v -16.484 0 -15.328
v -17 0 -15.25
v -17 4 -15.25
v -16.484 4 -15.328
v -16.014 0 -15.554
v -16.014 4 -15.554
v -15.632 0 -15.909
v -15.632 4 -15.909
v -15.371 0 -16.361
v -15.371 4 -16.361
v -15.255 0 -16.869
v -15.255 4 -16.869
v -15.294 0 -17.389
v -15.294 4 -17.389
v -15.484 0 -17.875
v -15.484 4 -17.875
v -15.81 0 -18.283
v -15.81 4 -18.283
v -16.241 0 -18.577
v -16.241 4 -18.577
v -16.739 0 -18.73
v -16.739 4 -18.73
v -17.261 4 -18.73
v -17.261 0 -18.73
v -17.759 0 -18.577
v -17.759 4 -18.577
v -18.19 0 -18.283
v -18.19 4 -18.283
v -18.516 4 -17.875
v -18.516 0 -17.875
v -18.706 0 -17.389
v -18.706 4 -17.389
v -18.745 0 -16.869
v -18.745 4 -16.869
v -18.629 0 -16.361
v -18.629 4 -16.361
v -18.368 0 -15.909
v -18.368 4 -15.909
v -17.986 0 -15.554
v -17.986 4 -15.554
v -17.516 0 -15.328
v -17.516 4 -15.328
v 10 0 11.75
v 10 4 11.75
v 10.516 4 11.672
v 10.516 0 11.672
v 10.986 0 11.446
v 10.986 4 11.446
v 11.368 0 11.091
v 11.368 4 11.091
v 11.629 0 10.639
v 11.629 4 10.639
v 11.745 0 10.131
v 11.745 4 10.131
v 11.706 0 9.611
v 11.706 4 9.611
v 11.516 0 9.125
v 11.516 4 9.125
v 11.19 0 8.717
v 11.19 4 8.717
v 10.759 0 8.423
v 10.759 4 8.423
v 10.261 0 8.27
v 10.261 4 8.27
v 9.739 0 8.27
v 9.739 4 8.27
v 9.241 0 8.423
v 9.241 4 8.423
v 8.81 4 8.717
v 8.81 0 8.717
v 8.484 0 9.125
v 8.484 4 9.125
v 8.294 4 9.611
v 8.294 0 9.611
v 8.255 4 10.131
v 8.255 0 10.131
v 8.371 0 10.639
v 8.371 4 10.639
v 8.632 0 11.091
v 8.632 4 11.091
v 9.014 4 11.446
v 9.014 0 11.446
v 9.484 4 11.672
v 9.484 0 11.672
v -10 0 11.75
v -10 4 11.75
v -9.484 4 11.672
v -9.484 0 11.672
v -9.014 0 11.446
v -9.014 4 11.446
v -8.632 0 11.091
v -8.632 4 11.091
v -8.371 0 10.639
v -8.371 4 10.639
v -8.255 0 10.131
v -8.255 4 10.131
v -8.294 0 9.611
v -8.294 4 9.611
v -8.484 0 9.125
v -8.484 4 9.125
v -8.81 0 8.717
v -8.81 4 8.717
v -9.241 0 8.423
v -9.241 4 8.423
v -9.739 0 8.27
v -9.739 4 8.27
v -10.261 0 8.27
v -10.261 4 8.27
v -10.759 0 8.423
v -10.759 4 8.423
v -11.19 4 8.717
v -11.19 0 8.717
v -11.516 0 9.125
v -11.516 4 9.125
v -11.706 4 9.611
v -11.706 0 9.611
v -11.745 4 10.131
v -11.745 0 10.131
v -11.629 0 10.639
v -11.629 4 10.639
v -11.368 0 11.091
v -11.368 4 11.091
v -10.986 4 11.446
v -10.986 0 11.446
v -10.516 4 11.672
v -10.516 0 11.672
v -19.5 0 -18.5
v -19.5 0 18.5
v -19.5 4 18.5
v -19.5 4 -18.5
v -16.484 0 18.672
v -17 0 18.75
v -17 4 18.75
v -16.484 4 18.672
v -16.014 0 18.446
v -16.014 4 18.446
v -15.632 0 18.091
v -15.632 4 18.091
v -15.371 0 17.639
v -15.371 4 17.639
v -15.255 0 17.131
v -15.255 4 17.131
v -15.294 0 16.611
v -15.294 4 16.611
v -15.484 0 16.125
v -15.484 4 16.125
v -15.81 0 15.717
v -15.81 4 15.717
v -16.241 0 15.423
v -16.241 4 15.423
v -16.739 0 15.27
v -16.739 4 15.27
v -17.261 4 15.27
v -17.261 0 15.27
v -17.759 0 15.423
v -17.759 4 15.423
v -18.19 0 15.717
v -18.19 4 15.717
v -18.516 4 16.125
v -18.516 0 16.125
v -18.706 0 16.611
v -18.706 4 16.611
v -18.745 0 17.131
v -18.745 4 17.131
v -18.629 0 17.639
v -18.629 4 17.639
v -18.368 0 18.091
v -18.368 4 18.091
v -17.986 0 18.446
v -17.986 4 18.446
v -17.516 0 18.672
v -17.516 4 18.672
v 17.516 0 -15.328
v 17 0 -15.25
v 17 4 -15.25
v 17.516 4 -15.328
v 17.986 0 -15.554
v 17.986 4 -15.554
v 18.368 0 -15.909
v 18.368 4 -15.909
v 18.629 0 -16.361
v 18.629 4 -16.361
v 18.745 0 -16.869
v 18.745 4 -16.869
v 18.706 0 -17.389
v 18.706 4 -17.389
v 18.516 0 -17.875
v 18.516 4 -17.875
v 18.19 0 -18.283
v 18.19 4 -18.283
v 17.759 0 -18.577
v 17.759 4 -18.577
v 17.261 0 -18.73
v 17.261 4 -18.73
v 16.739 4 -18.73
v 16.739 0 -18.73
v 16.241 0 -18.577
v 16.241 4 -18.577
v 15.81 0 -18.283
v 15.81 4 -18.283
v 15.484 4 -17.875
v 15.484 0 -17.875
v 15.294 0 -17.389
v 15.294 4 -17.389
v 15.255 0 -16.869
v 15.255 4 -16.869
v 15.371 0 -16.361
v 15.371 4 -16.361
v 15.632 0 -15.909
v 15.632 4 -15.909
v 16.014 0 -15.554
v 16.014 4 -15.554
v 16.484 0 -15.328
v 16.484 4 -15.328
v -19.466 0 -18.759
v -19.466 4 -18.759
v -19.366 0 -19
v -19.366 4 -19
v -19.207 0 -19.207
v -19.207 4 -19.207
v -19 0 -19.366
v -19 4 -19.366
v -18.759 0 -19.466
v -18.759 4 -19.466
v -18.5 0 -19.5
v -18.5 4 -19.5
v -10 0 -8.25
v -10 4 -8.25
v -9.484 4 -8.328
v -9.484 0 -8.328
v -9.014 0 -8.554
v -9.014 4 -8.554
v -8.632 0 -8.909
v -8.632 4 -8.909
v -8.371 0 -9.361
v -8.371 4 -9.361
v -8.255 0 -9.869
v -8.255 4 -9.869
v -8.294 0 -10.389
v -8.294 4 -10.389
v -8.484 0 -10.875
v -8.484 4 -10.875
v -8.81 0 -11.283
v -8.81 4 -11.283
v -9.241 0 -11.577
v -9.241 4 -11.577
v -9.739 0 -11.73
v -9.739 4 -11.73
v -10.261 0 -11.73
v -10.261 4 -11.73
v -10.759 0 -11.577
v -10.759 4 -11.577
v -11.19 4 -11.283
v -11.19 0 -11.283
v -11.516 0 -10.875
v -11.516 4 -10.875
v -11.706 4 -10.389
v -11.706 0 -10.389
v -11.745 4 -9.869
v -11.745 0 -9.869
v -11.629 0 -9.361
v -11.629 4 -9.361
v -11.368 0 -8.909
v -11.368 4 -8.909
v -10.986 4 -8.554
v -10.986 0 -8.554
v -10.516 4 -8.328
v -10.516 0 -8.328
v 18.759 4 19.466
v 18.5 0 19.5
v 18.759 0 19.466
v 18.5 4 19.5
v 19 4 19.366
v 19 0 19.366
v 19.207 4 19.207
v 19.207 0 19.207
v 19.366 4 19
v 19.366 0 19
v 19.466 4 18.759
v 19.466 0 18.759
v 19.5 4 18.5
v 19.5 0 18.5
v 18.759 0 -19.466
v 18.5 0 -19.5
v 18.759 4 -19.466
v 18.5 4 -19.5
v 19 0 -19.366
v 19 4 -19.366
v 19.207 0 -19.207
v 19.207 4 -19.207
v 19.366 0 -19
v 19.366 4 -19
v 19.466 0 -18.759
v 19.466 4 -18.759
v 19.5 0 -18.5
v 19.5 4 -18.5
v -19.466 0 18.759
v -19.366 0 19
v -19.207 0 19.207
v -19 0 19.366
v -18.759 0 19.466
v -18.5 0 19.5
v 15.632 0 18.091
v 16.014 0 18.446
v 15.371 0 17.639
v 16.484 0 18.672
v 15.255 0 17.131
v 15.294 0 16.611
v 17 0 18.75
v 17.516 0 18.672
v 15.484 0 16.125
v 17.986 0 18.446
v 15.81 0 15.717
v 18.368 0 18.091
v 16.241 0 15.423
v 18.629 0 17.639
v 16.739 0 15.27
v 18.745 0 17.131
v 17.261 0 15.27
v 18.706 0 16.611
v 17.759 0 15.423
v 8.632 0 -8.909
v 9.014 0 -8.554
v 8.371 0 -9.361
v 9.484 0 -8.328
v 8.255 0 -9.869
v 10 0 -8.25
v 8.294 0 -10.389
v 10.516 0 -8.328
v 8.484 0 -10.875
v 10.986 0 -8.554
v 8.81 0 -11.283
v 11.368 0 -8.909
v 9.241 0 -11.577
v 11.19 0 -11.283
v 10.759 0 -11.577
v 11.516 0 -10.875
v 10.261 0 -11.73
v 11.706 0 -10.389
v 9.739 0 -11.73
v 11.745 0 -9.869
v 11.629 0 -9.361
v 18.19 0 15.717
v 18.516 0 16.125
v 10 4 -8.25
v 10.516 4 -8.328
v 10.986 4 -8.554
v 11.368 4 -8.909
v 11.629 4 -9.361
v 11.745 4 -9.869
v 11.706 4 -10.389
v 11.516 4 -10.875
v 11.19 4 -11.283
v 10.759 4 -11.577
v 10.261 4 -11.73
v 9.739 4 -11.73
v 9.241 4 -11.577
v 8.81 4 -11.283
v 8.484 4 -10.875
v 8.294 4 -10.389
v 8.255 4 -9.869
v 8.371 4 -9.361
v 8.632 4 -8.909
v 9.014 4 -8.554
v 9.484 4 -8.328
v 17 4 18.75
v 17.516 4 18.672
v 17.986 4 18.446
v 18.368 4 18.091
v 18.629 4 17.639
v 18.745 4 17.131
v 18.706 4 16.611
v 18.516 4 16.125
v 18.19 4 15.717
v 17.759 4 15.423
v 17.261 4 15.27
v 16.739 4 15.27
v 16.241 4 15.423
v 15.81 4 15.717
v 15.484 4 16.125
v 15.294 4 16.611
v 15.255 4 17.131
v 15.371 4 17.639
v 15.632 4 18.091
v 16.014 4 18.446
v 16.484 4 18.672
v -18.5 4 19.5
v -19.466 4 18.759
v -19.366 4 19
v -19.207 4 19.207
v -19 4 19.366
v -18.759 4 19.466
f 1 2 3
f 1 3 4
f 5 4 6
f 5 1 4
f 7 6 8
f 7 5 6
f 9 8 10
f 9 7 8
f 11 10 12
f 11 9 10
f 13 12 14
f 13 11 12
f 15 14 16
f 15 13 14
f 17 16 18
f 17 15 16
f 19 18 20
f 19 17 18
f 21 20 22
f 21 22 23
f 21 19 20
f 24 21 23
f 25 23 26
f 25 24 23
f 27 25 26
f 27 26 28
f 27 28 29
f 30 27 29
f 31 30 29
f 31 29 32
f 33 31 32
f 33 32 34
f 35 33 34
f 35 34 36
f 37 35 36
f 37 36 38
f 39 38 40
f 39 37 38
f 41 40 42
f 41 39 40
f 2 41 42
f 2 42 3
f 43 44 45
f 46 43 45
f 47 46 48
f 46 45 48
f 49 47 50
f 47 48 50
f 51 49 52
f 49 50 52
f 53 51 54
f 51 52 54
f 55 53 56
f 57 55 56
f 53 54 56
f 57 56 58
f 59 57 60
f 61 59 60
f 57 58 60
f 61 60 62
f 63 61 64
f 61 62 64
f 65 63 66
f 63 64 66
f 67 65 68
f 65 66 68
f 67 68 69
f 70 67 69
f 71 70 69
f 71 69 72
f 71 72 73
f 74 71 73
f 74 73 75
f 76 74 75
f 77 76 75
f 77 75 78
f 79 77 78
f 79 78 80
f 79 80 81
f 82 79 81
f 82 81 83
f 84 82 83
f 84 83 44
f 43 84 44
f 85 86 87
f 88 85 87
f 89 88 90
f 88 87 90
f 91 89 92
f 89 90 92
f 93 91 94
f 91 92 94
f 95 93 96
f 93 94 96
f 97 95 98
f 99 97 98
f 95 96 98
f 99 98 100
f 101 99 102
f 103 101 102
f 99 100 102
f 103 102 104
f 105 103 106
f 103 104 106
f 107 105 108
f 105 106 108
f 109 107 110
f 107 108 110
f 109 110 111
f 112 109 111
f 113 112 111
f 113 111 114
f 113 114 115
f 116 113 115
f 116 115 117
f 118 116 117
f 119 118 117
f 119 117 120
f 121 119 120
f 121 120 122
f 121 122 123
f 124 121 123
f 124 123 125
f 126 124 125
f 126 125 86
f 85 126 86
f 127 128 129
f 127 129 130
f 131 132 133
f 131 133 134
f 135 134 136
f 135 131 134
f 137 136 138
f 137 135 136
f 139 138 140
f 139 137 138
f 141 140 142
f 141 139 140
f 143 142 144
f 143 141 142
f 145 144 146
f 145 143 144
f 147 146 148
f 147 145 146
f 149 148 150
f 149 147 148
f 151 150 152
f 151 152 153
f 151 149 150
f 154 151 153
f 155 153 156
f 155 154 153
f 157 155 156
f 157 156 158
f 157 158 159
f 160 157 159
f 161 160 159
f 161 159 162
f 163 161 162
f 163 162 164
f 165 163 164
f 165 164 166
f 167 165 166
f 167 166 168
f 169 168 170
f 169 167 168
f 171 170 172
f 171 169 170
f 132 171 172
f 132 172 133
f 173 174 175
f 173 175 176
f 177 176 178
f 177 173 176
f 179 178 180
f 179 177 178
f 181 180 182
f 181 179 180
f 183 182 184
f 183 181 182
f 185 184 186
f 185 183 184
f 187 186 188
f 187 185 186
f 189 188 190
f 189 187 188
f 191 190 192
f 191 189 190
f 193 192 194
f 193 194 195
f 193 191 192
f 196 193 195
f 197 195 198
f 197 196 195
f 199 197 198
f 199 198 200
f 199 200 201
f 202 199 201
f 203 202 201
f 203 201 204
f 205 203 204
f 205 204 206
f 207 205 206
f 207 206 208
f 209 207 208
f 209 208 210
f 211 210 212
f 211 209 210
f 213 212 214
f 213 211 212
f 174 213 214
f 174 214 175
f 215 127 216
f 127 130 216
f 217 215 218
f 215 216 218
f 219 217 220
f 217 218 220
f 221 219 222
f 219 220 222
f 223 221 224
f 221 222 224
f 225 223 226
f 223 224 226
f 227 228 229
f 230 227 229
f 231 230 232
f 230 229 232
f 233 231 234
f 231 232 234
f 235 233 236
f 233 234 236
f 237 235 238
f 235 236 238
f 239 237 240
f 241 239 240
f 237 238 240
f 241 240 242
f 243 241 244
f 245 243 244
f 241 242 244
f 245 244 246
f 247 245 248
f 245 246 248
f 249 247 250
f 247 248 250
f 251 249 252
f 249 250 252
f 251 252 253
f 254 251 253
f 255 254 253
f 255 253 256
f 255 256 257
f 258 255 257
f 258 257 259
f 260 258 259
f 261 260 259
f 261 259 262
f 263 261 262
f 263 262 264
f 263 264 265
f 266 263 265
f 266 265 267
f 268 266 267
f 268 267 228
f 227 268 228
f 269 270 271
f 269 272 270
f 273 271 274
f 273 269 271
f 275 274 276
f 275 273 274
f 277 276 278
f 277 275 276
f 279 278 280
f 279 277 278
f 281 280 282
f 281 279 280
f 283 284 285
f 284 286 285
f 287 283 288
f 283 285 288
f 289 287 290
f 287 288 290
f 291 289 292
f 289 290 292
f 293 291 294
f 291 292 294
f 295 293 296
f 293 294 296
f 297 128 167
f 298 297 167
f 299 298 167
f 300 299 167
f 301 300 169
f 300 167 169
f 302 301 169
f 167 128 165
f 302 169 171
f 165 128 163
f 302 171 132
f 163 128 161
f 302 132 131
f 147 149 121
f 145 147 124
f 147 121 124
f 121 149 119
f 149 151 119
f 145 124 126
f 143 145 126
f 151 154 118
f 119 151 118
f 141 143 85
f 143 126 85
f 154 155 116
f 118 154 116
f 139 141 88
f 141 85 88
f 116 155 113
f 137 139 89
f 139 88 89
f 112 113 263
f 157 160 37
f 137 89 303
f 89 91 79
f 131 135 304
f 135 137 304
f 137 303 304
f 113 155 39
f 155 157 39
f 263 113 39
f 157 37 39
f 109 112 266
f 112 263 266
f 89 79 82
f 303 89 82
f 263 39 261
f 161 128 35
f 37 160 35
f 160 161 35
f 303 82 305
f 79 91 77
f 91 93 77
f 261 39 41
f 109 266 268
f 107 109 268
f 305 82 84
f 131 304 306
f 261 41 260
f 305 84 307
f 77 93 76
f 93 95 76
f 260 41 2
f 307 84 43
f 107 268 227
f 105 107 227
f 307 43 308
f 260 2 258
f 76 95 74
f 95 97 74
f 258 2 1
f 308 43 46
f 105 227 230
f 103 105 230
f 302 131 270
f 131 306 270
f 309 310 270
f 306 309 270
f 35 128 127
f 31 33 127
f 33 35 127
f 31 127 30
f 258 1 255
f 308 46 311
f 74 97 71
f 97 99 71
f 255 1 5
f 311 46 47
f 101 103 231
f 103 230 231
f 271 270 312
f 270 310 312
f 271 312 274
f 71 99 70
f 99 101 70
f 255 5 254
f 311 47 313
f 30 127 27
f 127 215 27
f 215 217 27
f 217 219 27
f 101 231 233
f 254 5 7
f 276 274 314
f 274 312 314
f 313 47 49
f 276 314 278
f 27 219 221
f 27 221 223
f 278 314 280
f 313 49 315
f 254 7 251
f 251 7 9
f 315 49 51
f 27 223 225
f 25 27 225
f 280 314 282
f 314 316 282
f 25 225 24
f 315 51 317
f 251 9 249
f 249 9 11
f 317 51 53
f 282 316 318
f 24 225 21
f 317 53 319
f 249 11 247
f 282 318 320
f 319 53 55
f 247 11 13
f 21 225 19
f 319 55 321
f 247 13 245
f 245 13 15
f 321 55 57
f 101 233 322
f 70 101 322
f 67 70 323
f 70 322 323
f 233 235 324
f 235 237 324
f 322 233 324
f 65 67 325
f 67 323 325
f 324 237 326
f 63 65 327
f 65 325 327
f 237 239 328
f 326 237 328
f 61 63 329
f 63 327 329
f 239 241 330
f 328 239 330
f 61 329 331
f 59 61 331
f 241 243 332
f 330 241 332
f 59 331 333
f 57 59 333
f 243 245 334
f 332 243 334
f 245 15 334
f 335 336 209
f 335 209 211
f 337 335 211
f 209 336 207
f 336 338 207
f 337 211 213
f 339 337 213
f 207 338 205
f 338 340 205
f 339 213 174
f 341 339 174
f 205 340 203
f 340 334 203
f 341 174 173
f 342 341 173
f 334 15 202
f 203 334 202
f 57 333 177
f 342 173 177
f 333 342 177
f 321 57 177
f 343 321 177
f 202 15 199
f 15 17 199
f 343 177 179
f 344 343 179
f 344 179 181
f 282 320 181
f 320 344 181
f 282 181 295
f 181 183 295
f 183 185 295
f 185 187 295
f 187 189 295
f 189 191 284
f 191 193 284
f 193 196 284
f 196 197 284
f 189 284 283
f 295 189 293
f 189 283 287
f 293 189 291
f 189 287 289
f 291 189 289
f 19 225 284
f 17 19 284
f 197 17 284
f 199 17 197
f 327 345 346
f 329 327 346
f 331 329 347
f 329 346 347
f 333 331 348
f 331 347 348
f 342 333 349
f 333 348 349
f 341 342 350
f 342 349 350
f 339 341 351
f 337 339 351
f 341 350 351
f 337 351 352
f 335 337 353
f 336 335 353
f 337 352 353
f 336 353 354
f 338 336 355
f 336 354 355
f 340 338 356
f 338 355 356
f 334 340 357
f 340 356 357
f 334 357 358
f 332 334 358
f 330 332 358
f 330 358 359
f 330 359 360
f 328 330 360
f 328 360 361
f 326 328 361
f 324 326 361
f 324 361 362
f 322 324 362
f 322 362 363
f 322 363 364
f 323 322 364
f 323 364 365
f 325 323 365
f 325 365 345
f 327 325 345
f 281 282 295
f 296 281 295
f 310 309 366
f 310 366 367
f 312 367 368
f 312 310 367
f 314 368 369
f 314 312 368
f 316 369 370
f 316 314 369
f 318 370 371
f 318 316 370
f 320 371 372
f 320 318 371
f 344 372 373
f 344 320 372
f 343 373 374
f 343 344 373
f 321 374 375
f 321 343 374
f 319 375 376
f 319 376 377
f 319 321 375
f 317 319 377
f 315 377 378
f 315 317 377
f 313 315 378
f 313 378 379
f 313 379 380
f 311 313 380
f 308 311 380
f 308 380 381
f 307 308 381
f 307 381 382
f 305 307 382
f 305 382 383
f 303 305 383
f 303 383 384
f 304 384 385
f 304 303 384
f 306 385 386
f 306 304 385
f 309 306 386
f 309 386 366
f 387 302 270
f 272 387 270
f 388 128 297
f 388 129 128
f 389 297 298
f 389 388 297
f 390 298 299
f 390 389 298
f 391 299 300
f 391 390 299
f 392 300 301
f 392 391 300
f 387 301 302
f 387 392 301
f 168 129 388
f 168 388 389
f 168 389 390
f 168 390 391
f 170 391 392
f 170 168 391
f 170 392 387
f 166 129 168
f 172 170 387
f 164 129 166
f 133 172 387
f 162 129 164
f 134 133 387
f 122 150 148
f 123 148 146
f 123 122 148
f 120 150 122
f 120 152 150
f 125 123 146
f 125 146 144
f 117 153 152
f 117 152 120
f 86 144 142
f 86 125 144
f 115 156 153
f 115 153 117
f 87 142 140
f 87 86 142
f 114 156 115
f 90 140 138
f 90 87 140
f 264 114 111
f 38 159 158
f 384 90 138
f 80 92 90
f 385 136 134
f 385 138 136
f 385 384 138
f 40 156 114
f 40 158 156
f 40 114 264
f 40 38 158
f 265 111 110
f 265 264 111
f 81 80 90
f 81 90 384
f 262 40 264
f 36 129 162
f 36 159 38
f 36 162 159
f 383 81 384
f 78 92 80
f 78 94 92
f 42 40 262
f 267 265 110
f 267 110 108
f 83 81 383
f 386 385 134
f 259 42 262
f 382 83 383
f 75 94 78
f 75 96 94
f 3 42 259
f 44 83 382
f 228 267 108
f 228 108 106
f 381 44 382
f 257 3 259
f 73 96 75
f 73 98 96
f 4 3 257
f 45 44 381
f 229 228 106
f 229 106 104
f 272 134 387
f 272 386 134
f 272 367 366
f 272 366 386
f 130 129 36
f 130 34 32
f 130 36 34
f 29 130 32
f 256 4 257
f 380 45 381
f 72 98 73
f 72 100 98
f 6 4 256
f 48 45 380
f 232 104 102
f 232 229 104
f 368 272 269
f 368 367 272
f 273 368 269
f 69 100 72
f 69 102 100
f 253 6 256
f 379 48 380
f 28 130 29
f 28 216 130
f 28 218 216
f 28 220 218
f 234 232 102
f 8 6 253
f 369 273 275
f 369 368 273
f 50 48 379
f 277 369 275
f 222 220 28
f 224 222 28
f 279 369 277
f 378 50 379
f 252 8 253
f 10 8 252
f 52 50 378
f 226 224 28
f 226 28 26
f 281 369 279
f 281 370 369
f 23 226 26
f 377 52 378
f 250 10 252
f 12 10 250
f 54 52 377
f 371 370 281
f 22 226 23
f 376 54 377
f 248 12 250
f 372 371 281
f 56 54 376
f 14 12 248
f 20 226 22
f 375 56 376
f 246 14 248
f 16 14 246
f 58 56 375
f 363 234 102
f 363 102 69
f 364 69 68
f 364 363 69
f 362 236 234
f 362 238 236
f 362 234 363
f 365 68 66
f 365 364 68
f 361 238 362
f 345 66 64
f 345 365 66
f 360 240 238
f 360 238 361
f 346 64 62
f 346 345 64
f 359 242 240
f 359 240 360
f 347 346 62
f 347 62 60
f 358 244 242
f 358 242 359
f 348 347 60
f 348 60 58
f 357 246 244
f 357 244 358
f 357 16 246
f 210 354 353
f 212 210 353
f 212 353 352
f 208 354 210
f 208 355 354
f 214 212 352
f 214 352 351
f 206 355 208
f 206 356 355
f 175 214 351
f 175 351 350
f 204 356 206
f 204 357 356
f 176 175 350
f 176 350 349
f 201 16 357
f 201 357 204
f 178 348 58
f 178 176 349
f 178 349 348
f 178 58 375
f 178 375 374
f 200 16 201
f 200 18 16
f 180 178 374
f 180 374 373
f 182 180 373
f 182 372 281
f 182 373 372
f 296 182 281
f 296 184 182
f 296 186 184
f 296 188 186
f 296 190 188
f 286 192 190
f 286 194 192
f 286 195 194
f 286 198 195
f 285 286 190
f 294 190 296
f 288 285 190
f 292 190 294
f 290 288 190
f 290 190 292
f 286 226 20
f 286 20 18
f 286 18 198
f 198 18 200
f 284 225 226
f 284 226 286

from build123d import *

# Parameters (mm, degrees)
SKETCH1_W           = 39
SKETCH1_H           = 39
SKETCH1_R           = 1.75
BOSS_EXTRUDE1_DEPTH = 4
SKETCH2_R           = 1.75
CUT_EXTRUDE1_DEPTH  = 11
FILLET1_R           = 1


with BuildPart() as part:
    # Sketch1 → Boss-Extrude1 (new body)
    with BuildSketch(Plane(origin=(0, 0, 0), x_dir=(1, 0, 0), z_dir=(0, 1, 0))):
        Rectangle(SKETCH1_W, SKETCH1_H)
        with Locations(Location((17, 17, 0), (0, 0, 270))):
            Circle(SKETCH1_R, mode=Mode.SUBTRACT)
        with Locations(Location((17, -17, 0), (0, 0, 270))):
            Circle(SKETCH1_R, mode=Mode.SUBTRACT)
        with Locations(Location((-17, -17, 0), (0, 0, 270))):
            Circle(SKETCH1_R, mode=Mode.SUBTRACT)
        with Locations(Location((-17, 17, 0), (0, 0, 270))):
            Circle(SKETCH1_R, mode=Mode.SUBTRACT)
    extrude(amount=BOSS_EXTRUDE1_DEPTH)

    # Sketch2 → Cut-Extrude1 (cut)
    with BuildSketch(Plane(origin=(0, 4, 0), x_dir=(1, 0, 0), z_dir=(0, 1, 0))):
        with Locations(Location((10, 10, 0), (0, 0, 270))):
            Circle(SKETCH2_R)
        with Locations(Location((10, -10, 0), (0, 0, 270))):
            Circle(SKETCH2_R)
        with Locations(Location((-10, -10, 0), (0, 0, 270))):
            Circle(SKETCH2_R)
        with Locations(Location((-10, 10, 0), (0, 0, 270))):
            Circle(SKETCH2_R)
    extrude(amount=-CUT_EXTRUDE1_DEPTH, mode=Mode.SUBTRACT)

    # Fillet1
    fillet1_edges = [part.edges().sort_by_distance(p)[0] for p in [
        (19.5, 2, 19.5),
        (-19.5, 2, 19.5),
        (-19.5, 2, -19.5),
        (19.5, 2, -19.5),
    ]]
    fillet(fillet1_edges, radius=FILLET1_R)


solid = part.part
